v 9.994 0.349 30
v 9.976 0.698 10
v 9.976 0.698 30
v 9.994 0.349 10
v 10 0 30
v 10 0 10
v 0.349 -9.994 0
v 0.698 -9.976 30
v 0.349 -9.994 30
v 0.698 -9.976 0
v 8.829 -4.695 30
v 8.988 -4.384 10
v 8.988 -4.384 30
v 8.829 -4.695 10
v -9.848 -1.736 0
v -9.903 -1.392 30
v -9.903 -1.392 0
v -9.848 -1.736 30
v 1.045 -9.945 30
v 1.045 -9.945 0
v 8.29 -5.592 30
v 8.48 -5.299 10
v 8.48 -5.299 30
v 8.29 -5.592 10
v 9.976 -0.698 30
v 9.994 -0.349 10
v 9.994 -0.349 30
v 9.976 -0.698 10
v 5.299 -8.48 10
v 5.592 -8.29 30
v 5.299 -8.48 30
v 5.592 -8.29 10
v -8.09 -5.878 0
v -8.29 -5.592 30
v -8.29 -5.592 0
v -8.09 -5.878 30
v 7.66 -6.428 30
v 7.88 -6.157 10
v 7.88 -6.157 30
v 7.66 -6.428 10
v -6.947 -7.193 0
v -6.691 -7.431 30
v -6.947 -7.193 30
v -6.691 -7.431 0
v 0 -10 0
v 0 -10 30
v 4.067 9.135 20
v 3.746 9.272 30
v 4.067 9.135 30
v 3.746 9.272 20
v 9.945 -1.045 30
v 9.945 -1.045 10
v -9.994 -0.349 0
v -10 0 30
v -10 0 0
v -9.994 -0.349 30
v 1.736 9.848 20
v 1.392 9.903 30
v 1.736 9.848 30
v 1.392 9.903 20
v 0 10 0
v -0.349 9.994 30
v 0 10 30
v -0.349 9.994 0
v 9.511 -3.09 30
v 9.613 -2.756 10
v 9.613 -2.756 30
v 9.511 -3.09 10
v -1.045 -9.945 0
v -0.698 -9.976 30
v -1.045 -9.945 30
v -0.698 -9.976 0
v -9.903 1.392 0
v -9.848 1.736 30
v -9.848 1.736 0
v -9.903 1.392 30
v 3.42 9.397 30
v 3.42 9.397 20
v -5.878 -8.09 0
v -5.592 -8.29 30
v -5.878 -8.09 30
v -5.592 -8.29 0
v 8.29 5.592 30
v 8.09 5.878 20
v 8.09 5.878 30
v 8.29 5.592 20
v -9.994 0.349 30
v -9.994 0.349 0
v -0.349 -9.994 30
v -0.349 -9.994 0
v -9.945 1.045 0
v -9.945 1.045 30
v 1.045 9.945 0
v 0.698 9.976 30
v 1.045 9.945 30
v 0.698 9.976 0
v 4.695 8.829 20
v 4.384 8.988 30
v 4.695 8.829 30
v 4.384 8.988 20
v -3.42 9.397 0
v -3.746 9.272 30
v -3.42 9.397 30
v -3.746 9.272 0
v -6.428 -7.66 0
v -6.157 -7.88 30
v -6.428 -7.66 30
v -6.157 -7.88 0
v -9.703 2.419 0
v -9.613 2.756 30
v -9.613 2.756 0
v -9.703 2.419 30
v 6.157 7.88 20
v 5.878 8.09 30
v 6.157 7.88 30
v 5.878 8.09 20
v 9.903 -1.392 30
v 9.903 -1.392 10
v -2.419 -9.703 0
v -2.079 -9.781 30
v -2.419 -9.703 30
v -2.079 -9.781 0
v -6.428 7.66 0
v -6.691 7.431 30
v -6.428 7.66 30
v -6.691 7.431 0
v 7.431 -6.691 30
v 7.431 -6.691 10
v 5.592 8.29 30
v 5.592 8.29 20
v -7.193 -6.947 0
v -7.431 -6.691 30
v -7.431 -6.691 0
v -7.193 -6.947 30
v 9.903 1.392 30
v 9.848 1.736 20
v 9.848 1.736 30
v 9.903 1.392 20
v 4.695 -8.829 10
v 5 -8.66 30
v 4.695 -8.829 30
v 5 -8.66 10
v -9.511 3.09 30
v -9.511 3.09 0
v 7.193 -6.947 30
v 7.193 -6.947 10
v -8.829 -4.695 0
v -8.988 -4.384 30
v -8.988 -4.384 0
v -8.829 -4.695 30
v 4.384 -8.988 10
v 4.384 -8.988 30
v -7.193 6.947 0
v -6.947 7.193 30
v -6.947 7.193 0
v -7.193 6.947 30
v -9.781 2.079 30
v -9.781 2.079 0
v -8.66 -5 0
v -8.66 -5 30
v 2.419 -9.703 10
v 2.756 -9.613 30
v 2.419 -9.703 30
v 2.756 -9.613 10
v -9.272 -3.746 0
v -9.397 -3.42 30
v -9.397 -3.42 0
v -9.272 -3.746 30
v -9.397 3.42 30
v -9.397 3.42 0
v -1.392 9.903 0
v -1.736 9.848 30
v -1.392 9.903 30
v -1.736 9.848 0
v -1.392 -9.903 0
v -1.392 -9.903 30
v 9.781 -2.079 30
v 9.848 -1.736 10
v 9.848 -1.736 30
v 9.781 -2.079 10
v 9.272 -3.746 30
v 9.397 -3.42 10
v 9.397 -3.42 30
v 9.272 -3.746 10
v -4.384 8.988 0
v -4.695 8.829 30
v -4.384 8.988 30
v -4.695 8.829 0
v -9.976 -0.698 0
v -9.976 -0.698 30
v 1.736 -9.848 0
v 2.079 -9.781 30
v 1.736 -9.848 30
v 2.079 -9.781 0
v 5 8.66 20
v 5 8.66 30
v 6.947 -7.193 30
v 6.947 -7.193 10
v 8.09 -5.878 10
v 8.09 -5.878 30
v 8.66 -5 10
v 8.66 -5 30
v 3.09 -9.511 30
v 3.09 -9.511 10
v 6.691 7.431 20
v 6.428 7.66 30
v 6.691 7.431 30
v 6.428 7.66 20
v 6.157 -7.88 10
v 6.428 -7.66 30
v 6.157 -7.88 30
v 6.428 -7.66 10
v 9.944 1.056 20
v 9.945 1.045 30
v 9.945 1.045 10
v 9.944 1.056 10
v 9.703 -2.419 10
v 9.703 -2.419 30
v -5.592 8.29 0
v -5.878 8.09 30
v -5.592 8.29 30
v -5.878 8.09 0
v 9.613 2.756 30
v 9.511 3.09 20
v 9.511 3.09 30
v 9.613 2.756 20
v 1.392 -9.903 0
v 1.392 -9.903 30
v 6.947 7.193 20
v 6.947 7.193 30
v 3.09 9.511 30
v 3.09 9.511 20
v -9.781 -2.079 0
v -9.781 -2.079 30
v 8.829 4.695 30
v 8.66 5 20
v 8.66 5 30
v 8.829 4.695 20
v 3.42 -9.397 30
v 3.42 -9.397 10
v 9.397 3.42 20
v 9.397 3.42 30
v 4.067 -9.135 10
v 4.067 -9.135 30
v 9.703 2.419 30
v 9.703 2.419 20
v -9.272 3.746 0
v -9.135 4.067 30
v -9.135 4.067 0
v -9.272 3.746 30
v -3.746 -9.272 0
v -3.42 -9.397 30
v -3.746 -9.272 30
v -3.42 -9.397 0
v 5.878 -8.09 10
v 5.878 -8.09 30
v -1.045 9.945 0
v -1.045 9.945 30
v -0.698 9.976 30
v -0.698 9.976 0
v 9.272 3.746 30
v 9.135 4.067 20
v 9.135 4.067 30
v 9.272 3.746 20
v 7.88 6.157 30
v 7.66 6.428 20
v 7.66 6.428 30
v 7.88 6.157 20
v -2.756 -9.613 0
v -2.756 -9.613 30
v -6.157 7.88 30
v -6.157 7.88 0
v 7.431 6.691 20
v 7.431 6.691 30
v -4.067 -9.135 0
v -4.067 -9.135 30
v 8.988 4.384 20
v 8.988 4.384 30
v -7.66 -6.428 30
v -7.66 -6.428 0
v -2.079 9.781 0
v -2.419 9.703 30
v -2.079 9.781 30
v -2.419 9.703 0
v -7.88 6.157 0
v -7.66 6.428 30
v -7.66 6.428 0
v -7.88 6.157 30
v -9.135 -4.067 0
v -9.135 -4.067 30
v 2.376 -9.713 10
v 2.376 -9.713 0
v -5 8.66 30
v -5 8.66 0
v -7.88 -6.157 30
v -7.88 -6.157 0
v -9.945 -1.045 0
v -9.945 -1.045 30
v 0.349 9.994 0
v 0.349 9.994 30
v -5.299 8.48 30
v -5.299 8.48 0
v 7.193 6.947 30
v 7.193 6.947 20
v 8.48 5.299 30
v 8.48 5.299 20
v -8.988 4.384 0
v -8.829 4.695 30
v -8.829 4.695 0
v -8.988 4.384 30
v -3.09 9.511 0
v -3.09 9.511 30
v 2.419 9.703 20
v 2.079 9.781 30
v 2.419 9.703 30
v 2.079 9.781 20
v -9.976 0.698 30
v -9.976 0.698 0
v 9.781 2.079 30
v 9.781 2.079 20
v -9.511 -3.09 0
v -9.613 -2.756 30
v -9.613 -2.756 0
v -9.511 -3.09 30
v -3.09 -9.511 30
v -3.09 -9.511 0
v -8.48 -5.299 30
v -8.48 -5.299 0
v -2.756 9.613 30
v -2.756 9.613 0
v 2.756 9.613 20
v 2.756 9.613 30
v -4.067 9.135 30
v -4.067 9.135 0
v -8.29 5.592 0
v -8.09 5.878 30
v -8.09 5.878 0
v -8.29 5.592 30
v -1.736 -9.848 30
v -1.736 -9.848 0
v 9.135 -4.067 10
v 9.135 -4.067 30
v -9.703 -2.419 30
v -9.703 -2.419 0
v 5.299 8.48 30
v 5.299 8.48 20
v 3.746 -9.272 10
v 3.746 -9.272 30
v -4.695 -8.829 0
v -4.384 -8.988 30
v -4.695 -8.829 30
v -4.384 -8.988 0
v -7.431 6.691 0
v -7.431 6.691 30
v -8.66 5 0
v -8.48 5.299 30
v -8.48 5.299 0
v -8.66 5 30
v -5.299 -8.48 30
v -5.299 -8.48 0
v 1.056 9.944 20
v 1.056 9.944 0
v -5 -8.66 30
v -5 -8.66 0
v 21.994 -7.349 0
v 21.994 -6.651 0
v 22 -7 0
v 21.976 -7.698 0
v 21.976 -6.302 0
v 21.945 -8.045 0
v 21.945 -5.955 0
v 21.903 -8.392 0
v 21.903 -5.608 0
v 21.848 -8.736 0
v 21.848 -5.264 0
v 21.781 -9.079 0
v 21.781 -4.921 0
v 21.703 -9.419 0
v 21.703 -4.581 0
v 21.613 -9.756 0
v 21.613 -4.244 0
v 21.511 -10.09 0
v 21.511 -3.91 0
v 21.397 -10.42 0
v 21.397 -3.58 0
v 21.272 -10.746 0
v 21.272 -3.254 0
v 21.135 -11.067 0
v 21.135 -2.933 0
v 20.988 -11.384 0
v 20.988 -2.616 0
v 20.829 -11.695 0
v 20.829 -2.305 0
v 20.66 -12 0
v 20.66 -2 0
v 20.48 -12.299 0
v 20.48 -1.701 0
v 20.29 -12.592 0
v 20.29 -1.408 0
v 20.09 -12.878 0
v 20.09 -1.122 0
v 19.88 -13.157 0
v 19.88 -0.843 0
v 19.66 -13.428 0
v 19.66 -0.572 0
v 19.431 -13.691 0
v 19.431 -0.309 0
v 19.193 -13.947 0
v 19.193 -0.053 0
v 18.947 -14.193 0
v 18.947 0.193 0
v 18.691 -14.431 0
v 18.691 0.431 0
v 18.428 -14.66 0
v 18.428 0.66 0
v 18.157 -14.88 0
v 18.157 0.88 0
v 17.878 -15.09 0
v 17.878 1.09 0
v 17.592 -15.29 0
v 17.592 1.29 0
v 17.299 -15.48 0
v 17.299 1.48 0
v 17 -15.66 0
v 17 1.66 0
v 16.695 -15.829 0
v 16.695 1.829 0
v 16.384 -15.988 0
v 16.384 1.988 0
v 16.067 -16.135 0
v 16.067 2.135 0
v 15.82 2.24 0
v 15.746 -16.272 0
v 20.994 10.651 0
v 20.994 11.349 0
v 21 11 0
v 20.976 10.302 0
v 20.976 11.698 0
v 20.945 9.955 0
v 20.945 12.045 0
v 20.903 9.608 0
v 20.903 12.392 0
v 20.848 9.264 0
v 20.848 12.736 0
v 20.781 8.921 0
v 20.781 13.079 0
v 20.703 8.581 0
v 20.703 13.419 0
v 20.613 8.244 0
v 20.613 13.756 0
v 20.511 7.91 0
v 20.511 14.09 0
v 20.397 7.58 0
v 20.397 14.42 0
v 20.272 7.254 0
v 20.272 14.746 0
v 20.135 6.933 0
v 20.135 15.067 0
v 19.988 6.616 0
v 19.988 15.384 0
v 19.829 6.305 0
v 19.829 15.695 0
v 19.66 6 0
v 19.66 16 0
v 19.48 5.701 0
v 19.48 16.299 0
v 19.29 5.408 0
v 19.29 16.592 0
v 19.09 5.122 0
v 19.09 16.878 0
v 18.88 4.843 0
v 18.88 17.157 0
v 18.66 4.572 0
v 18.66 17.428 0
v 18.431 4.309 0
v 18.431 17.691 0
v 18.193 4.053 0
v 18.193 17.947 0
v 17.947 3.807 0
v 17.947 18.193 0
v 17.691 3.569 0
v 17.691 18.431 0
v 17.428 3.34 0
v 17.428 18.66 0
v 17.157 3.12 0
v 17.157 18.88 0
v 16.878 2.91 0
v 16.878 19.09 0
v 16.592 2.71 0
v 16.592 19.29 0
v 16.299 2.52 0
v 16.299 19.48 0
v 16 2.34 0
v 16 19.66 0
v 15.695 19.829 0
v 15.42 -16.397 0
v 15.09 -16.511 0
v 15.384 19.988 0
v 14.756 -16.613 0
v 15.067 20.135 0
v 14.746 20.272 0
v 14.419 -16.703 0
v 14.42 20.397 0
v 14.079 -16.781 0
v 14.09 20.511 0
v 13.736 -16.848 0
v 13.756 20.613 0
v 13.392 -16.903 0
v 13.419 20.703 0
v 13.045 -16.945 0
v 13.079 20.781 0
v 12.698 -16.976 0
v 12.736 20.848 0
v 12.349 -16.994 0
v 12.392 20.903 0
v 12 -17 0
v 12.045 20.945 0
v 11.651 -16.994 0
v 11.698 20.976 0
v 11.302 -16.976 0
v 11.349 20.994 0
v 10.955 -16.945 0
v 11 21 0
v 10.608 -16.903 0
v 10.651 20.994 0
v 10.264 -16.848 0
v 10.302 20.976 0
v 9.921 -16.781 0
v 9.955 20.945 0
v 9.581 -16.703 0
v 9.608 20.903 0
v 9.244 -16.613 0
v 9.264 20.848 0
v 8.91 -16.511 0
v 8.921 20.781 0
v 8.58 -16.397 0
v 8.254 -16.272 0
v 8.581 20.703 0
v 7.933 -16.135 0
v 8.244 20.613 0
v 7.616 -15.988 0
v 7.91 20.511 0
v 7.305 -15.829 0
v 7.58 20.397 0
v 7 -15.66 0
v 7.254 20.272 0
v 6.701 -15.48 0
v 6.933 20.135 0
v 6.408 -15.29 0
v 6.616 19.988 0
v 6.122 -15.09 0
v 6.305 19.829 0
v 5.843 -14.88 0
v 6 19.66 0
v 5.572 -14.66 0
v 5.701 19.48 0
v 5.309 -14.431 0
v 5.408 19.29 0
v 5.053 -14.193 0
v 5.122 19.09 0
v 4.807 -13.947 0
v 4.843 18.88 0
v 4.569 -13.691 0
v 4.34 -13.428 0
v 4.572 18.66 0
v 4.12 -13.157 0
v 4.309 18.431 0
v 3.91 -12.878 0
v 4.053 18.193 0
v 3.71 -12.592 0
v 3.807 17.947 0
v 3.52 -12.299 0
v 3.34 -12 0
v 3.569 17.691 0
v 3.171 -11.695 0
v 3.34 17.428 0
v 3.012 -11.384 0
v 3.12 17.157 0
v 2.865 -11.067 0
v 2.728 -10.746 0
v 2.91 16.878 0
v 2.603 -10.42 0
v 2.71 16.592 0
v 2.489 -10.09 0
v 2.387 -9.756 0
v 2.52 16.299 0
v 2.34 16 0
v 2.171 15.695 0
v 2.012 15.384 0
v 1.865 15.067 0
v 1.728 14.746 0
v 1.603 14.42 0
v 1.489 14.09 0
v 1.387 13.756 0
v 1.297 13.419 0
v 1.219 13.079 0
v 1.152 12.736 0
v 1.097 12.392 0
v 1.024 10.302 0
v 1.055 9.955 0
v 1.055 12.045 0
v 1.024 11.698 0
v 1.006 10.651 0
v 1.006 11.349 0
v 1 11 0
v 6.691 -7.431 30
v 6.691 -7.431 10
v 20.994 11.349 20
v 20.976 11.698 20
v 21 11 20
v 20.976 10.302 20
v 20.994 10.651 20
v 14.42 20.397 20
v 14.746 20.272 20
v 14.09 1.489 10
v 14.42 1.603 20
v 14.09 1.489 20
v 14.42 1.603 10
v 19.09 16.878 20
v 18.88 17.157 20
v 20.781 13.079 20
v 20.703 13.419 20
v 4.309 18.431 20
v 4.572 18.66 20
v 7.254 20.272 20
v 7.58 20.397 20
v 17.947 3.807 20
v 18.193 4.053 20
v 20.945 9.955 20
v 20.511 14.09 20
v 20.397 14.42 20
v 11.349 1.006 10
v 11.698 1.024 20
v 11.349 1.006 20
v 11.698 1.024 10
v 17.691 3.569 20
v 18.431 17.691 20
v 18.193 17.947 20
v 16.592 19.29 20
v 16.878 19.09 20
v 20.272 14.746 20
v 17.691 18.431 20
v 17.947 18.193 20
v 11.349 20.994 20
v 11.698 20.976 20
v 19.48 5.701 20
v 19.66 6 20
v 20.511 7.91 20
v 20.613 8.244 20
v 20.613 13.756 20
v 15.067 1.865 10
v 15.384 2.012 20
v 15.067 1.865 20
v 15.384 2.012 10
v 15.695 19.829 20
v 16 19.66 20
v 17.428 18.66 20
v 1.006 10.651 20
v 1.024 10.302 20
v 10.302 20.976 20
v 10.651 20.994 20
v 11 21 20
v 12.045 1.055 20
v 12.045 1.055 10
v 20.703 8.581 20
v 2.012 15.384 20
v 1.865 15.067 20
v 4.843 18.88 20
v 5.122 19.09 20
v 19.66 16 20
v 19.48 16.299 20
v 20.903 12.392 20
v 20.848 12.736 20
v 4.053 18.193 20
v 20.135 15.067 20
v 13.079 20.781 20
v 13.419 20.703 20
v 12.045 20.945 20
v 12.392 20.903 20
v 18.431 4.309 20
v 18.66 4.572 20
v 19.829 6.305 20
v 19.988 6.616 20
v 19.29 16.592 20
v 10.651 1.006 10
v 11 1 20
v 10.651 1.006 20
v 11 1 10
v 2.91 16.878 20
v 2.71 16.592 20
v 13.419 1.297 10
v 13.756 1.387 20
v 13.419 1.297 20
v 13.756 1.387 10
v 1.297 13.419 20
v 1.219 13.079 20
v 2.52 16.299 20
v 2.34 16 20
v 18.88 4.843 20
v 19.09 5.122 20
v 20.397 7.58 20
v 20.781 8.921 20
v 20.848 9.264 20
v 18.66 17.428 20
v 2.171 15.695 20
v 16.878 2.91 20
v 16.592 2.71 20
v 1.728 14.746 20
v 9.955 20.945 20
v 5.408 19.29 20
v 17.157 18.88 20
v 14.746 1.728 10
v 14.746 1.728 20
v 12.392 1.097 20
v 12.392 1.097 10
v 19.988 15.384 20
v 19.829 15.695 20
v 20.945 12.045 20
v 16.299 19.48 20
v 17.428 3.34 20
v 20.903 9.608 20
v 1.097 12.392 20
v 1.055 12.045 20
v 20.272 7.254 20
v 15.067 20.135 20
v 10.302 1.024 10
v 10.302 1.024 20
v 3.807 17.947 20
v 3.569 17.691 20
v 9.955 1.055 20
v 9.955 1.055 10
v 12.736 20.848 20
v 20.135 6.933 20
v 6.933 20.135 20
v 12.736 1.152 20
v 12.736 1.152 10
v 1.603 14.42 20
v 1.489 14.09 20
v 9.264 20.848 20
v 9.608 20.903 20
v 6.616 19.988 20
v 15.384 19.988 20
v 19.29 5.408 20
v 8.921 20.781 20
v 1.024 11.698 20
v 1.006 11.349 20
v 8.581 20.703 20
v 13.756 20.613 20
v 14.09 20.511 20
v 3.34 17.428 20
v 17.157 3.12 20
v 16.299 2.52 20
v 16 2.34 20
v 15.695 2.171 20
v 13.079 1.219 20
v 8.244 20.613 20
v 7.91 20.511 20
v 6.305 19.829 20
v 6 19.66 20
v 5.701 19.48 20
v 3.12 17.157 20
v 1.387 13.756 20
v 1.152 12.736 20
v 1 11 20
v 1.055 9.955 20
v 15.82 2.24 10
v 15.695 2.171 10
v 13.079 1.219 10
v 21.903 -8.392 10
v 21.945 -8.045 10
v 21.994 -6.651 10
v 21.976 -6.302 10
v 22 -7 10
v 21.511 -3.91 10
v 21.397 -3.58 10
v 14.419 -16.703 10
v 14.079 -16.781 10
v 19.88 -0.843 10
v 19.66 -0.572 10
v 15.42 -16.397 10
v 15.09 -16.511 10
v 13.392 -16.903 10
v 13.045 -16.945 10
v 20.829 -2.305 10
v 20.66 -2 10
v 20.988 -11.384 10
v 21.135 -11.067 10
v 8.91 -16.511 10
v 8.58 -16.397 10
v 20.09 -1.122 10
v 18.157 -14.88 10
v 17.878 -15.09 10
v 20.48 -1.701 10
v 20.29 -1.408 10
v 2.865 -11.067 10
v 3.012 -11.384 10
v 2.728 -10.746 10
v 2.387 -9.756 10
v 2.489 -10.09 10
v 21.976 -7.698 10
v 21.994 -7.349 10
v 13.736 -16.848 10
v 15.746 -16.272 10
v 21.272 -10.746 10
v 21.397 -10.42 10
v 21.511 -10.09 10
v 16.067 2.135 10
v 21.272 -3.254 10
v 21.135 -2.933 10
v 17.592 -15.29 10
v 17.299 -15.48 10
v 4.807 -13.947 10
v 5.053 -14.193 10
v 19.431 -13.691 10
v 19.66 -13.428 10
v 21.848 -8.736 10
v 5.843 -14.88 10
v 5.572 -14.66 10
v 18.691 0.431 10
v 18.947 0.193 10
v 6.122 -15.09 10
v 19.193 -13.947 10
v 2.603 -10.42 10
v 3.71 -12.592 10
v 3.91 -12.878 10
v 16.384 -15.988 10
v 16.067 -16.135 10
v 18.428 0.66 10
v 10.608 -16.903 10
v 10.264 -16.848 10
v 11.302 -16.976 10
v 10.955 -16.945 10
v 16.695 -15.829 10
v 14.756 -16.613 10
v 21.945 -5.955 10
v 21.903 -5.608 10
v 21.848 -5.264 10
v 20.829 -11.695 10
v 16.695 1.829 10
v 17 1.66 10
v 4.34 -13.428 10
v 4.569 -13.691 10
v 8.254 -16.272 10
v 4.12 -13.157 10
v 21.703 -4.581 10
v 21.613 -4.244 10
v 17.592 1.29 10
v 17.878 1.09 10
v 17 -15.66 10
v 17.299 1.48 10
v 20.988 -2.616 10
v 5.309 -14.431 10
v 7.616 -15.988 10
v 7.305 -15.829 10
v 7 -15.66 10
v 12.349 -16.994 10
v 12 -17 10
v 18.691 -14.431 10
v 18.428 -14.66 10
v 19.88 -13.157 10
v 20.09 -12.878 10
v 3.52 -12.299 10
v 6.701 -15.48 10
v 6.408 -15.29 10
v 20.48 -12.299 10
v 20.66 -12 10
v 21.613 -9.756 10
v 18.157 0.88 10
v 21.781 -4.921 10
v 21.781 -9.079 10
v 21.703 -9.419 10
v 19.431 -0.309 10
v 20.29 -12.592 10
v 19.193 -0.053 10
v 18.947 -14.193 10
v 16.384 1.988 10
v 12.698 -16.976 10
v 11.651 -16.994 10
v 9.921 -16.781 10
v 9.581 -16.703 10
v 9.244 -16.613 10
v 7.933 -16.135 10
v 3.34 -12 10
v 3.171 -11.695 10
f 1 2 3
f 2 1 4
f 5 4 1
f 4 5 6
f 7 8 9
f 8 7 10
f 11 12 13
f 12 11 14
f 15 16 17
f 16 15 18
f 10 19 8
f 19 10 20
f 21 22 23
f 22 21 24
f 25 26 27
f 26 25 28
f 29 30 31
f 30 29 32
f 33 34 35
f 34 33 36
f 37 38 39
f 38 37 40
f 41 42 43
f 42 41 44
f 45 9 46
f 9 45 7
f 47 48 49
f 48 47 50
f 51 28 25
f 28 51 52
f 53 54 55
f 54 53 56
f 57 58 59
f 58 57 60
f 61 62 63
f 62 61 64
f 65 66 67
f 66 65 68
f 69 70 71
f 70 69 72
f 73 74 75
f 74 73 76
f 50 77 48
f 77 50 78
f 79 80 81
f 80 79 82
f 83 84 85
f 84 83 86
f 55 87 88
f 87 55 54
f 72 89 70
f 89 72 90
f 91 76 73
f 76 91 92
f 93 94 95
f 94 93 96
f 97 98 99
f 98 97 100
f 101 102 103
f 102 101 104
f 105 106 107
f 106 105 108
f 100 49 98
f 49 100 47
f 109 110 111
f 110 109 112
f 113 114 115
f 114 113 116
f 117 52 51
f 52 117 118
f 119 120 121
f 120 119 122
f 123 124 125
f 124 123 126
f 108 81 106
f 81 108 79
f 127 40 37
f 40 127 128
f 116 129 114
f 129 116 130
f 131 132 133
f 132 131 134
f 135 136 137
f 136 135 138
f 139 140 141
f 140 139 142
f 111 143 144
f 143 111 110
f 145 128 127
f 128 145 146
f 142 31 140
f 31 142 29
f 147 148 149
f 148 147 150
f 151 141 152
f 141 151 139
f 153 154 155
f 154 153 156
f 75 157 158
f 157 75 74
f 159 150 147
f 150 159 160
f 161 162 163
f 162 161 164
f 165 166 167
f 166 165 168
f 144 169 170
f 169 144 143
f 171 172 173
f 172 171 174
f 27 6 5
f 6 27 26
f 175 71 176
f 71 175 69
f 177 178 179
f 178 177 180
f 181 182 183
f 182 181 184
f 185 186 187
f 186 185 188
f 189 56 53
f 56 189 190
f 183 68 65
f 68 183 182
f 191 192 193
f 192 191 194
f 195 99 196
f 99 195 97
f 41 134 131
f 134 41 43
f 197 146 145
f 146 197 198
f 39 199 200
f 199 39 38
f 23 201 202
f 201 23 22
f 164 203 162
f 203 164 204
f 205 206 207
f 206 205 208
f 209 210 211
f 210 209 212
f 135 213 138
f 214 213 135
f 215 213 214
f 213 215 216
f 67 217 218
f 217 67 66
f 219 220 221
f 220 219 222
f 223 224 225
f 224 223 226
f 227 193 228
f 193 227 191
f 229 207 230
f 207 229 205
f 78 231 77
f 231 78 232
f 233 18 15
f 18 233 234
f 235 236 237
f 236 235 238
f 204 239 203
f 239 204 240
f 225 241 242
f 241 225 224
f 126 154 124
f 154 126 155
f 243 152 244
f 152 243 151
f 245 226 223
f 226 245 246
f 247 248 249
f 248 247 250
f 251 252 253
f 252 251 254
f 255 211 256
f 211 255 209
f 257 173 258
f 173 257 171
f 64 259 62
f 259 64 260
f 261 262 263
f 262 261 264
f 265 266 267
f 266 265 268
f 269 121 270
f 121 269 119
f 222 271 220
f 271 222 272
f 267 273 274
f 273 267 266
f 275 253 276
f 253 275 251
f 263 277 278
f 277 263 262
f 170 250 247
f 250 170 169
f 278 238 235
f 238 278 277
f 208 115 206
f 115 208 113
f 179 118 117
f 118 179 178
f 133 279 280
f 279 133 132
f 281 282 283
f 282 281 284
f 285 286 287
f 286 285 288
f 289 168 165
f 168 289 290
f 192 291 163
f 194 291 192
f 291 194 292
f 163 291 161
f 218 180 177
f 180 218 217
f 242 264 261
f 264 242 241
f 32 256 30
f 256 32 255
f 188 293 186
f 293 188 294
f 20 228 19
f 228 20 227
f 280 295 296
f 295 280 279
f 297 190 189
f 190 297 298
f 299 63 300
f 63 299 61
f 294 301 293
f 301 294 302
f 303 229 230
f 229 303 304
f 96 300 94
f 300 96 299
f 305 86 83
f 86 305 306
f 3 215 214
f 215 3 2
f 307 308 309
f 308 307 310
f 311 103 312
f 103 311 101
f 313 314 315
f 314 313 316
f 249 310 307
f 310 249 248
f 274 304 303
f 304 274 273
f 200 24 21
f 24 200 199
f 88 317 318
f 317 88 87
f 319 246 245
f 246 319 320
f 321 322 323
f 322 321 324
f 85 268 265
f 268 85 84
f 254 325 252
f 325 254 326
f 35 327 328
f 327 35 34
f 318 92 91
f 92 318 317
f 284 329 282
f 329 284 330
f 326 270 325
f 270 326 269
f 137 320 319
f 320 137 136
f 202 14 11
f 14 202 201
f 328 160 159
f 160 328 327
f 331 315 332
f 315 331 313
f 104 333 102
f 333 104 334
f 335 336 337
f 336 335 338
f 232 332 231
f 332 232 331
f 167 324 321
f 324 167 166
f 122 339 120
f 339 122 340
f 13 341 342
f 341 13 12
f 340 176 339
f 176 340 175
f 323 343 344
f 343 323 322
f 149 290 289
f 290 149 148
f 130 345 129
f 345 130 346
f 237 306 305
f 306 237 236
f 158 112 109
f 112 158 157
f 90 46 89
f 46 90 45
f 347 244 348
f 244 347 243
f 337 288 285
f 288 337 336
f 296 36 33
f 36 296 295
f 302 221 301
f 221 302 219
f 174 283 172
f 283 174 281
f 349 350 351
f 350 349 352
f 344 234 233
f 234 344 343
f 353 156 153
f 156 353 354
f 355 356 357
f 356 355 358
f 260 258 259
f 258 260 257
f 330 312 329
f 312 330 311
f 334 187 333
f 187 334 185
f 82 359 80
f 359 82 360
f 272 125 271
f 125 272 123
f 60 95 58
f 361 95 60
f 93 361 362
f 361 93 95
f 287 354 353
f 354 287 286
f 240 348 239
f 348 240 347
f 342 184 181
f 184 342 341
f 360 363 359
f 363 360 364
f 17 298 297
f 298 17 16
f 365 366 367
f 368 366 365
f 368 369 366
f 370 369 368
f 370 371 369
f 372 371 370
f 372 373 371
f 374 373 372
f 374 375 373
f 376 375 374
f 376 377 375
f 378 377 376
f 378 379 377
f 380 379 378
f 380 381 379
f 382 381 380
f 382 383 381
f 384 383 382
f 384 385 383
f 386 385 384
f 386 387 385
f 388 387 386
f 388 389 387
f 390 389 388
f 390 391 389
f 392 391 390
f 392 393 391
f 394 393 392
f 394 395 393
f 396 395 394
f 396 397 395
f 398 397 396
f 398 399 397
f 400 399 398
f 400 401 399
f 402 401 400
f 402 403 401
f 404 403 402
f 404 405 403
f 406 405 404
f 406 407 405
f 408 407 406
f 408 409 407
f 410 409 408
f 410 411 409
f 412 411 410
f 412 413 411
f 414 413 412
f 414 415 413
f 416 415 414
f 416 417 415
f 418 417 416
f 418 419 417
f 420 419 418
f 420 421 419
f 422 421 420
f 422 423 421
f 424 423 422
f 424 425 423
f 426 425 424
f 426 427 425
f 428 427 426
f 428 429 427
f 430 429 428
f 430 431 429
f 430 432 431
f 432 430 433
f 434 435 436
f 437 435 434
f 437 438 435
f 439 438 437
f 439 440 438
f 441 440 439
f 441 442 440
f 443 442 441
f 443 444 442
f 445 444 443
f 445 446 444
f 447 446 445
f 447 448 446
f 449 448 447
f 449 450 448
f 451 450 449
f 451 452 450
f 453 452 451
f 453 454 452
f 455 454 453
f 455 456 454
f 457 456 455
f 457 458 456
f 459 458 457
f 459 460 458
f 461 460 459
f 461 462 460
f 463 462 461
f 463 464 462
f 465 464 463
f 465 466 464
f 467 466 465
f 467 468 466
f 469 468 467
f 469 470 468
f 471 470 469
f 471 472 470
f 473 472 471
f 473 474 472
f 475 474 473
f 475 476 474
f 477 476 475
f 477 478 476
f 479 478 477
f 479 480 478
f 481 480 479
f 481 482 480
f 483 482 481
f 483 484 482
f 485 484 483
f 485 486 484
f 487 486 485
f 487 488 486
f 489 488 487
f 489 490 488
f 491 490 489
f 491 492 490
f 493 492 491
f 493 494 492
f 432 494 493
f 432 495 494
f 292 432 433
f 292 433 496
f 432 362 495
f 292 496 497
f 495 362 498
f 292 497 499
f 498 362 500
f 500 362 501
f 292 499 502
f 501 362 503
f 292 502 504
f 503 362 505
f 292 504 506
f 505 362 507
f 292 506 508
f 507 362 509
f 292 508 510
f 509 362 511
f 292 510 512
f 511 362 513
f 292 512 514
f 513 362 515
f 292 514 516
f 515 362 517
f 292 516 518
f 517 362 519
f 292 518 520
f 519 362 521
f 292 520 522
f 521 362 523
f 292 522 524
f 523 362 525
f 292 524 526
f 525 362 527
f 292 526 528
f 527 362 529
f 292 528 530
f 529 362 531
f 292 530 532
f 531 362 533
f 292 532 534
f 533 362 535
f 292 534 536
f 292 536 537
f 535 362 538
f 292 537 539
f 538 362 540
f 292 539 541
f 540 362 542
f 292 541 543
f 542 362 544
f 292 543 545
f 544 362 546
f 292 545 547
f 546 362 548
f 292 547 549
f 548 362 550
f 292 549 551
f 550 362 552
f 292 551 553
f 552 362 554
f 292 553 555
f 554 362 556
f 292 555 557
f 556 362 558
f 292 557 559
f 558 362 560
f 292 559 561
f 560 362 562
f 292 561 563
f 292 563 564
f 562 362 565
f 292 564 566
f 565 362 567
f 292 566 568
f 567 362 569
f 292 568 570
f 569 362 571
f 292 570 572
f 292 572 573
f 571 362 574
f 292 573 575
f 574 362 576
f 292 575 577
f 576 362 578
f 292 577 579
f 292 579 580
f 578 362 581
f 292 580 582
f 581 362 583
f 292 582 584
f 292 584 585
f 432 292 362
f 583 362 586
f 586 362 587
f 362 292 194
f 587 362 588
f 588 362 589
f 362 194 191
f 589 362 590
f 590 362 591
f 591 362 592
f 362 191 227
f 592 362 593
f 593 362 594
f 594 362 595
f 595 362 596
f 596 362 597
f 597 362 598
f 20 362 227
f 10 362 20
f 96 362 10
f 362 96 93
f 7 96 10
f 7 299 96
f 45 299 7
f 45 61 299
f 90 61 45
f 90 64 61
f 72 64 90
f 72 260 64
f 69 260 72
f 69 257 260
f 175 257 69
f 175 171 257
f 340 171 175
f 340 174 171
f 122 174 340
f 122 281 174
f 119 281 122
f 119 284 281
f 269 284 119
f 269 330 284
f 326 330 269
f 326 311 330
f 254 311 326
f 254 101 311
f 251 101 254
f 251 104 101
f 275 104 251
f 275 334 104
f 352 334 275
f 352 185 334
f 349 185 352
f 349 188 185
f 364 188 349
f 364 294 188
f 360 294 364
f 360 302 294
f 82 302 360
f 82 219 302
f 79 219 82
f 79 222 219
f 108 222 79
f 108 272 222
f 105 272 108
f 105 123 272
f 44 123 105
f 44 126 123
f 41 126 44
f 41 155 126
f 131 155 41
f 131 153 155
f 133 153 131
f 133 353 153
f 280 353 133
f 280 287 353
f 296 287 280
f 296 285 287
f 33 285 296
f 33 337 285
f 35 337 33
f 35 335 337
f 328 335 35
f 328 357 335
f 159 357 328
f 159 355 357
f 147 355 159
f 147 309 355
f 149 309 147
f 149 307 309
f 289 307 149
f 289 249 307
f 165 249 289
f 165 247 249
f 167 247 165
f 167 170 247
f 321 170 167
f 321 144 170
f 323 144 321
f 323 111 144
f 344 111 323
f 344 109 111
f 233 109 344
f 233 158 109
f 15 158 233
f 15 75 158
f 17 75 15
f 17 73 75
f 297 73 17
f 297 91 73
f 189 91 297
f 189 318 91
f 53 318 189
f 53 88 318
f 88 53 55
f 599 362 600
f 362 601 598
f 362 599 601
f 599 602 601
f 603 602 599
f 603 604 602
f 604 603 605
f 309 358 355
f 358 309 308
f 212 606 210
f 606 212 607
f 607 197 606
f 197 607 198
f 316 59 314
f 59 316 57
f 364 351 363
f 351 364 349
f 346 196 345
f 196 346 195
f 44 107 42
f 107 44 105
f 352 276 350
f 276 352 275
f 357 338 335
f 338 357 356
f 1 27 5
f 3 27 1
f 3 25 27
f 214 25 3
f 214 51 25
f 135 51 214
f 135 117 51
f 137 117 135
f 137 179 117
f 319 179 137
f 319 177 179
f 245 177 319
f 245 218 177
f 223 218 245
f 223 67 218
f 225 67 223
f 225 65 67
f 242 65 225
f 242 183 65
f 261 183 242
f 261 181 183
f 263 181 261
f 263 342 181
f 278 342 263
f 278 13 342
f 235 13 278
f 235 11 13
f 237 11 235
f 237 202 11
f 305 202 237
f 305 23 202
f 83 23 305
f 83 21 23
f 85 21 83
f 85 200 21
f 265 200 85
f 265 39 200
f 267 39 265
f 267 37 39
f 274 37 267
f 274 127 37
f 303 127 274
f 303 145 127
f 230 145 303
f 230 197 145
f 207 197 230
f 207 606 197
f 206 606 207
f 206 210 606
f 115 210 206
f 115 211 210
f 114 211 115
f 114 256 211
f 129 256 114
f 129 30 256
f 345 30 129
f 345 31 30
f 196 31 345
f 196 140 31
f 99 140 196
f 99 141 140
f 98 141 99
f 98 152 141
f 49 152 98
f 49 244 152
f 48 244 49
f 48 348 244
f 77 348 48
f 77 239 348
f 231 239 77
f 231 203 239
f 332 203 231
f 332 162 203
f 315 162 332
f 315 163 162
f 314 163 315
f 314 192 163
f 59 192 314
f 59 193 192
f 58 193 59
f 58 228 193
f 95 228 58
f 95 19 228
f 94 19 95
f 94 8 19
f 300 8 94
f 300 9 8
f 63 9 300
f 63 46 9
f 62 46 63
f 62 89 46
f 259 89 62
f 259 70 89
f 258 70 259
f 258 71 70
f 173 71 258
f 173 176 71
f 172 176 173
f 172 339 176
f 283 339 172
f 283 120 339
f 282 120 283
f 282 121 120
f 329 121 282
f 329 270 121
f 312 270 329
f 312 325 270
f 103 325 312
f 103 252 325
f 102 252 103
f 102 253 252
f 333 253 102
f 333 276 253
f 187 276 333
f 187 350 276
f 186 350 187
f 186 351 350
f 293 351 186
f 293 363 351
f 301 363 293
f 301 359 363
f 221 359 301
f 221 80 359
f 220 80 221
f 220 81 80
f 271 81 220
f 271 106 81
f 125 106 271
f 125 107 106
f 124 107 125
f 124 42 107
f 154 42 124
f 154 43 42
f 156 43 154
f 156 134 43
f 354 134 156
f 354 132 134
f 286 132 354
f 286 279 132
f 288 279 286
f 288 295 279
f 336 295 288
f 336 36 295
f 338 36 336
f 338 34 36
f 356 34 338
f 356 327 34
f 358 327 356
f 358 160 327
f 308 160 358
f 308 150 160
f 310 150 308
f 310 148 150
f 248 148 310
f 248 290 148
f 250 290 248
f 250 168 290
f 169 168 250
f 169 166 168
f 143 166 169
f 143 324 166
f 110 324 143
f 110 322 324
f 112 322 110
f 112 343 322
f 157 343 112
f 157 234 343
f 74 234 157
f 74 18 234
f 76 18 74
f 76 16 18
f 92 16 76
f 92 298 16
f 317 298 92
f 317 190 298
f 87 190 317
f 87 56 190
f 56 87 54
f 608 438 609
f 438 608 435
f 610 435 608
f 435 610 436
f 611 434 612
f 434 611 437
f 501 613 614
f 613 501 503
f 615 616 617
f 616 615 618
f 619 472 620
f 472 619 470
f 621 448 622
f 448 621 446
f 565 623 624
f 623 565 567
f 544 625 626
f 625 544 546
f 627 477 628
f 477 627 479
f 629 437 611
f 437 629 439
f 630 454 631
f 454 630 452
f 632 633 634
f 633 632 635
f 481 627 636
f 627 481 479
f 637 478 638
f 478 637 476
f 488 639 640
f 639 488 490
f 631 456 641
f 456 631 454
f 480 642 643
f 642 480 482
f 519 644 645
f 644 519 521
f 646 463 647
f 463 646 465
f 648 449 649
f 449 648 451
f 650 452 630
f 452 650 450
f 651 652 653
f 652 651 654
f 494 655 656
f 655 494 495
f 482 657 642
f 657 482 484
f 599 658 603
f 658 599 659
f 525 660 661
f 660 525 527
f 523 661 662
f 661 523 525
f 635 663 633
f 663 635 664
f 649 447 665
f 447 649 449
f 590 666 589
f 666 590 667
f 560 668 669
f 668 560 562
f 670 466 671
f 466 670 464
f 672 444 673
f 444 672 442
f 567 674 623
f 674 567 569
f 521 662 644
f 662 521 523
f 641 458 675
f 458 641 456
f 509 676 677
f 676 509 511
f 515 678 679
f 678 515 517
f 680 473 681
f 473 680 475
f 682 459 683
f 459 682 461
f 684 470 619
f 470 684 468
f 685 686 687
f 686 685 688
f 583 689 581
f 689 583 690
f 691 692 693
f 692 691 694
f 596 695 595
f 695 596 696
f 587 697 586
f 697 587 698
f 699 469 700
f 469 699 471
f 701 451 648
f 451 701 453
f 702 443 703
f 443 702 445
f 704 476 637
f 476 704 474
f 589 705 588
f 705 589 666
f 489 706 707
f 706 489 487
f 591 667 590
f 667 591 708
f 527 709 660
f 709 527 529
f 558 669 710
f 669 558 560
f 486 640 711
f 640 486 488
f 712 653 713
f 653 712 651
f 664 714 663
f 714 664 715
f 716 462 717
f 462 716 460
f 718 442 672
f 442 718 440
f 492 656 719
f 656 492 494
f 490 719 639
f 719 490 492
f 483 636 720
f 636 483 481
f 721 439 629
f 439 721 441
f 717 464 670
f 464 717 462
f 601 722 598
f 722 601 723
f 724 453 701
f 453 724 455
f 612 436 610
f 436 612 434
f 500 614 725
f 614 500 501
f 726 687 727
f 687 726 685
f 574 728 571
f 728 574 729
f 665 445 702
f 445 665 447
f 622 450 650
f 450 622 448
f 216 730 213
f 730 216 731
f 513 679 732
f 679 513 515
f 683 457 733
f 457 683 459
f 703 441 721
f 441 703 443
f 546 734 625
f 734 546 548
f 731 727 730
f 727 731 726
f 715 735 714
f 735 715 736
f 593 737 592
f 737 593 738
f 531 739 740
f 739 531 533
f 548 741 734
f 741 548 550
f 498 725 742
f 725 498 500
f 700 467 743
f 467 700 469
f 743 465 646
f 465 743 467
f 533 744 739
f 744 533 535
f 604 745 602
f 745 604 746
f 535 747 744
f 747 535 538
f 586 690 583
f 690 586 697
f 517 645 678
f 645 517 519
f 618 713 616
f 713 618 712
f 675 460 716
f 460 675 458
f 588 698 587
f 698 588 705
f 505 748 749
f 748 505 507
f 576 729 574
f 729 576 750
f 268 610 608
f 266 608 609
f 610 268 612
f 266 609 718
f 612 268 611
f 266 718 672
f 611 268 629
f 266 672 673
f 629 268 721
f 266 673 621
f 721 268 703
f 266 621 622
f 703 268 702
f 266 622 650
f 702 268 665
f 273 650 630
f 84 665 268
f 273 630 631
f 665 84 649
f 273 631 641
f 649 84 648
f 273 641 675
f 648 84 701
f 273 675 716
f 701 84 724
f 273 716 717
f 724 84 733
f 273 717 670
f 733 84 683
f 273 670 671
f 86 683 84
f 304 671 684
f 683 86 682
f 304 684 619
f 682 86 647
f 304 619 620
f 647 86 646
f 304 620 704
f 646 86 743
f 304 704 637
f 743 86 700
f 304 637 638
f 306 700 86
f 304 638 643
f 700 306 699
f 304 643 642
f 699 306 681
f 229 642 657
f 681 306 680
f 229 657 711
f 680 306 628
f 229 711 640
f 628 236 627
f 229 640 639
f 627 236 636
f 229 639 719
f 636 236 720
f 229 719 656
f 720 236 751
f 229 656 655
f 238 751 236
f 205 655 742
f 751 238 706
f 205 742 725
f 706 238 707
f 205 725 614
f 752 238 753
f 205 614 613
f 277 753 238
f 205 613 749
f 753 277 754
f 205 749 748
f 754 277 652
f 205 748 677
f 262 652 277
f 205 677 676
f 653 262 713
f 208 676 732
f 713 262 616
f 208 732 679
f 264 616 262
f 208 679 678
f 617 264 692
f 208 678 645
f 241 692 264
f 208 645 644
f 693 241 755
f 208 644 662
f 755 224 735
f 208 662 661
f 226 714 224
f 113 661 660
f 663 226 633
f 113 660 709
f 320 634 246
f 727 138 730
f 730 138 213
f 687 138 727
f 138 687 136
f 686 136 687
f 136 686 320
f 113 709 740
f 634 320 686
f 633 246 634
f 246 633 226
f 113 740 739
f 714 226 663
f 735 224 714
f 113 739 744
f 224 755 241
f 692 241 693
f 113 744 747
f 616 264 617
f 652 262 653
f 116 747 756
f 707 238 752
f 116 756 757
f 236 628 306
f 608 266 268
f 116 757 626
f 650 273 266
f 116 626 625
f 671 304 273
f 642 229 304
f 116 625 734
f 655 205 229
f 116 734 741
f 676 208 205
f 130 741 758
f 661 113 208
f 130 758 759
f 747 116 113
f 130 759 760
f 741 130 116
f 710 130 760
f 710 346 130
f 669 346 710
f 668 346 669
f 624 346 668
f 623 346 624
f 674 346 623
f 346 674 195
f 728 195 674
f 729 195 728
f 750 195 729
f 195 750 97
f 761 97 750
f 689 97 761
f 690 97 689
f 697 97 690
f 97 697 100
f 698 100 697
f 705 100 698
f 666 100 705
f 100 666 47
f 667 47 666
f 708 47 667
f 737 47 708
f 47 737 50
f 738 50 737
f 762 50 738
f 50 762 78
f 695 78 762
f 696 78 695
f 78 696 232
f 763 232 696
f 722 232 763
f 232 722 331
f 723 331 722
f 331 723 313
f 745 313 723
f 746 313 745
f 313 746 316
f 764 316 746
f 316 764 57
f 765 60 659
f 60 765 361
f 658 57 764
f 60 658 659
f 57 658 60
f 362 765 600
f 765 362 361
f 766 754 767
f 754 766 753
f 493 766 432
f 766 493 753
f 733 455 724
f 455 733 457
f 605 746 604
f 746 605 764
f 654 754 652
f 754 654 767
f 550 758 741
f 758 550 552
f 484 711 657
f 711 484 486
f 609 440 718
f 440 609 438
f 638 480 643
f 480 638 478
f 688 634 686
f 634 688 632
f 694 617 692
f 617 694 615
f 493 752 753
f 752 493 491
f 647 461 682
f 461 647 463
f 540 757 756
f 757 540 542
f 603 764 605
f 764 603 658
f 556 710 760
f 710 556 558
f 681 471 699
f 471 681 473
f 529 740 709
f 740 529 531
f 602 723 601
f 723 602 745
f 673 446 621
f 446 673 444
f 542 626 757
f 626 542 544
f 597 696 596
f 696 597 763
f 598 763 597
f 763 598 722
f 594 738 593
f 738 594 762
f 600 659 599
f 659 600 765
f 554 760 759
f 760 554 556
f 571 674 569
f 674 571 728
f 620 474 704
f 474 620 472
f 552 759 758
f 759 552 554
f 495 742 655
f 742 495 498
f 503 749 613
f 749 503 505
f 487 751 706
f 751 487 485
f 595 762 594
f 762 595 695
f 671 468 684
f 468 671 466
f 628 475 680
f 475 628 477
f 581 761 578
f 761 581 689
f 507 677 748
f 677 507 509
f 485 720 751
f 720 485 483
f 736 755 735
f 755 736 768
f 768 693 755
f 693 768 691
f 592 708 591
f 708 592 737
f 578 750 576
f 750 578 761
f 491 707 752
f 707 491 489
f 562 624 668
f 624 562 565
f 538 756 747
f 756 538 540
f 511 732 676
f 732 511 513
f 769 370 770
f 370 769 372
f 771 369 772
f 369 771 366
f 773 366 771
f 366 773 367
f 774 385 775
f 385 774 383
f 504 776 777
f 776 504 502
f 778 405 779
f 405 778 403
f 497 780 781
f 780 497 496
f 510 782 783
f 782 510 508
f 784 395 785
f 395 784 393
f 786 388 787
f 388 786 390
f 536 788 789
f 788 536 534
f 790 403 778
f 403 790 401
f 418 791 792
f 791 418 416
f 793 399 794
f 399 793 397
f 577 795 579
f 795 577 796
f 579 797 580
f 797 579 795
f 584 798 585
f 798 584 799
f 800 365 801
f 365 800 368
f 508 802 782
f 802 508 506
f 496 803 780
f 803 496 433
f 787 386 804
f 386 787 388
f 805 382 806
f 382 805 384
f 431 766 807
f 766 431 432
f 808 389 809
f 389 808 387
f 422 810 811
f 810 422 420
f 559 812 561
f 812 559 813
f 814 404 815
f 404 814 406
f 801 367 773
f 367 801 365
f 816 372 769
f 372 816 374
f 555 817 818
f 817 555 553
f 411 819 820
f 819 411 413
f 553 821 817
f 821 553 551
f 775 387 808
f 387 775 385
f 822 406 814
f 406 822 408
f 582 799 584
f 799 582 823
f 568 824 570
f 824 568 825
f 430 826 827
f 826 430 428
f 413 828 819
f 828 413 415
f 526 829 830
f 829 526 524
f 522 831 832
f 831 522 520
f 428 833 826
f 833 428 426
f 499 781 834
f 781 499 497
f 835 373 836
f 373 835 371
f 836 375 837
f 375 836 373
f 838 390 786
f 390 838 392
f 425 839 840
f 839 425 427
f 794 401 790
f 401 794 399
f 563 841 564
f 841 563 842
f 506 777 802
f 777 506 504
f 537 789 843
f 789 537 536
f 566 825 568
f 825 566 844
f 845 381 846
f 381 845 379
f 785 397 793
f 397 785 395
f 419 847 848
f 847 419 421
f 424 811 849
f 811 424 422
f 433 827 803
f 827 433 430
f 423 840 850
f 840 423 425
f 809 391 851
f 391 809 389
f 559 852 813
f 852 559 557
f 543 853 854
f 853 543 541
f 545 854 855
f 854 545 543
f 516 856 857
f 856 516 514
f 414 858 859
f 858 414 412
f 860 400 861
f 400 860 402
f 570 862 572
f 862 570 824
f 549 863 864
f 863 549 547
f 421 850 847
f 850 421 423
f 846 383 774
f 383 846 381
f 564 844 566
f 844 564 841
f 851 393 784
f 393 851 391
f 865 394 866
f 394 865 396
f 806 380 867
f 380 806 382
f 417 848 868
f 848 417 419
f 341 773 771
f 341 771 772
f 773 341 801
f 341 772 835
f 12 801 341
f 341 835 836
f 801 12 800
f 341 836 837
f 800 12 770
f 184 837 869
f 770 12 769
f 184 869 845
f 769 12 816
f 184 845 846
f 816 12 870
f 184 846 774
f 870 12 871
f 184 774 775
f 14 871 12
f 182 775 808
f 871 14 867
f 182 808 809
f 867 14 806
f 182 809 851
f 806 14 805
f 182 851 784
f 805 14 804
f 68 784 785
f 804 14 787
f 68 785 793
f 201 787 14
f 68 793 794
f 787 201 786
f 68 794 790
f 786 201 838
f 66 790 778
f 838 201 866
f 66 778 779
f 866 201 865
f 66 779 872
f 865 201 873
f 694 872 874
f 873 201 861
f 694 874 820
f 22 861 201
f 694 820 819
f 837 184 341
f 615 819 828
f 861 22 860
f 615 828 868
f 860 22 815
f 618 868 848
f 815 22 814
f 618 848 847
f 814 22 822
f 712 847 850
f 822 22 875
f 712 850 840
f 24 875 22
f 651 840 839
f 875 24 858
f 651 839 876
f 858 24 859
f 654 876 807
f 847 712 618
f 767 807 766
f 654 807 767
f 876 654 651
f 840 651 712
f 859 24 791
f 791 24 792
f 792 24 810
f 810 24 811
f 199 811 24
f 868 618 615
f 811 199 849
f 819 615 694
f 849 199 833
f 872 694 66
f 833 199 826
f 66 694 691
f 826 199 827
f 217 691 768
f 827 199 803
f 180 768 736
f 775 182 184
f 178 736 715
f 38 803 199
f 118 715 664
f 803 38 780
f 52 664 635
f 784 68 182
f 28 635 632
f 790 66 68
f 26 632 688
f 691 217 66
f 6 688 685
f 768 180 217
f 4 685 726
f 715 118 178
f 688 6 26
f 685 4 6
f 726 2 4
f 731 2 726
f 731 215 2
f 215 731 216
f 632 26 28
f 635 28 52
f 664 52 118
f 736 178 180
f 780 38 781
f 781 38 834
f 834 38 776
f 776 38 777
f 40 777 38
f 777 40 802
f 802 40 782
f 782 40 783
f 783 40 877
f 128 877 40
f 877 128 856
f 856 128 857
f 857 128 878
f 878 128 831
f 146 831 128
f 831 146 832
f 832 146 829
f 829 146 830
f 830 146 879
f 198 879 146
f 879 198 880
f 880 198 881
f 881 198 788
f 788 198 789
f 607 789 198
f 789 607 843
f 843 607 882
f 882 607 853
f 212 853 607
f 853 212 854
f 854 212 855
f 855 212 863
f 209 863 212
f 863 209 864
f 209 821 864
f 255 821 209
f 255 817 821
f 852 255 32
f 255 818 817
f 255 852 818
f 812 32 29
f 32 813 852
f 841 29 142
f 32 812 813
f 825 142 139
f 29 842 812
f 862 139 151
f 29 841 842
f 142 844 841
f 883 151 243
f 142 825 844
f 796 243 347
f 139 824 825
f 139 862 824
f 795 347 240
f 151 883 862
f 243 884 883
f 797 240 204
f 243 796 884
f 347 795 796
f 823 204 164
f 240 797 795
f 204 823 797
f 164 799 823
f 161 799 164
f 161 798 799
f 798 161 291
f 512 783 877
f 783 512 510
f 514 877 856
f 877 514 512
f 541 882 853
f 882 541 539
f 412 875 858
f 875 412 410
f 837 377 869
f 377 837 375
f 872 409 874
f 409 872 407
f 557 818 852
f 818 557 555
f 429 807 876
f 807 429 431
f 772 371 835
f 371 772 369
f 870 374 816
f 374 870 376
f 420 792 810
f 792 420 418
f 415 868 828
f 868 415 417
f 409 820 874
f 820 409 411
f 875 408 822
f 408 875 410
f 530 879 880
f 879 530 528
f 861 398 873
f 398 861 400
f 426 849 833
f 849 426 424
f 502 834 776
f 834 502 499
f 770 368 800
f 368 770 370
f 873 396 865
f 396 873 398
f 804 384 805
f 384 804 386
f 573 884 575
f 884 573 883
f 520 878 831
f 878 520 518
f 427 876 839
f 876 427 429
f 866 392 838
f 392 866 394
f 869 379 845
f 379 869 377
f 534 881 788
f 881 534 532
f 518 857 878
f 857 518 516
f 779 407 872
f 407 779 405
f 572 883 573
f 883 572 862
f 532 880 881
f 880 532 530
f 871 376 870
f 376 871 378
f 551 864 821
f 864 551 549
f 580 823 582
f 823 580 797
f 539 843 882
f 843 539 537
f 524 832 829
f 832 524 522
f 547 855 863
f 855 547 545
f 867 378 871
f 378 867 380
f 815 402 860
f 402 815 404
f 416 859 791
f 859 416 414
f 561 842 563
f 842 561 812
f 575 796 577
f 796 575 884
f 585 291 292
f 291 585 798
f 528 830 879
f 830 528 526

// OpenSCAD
$fn = 180;

cylinder(h=30, r=10);
translate([11, 11, 0]) {
	cylinder(h=20, r=10);
}
translate([12, -7, 0]) {
	cylinder(h=10, r=10);
}
